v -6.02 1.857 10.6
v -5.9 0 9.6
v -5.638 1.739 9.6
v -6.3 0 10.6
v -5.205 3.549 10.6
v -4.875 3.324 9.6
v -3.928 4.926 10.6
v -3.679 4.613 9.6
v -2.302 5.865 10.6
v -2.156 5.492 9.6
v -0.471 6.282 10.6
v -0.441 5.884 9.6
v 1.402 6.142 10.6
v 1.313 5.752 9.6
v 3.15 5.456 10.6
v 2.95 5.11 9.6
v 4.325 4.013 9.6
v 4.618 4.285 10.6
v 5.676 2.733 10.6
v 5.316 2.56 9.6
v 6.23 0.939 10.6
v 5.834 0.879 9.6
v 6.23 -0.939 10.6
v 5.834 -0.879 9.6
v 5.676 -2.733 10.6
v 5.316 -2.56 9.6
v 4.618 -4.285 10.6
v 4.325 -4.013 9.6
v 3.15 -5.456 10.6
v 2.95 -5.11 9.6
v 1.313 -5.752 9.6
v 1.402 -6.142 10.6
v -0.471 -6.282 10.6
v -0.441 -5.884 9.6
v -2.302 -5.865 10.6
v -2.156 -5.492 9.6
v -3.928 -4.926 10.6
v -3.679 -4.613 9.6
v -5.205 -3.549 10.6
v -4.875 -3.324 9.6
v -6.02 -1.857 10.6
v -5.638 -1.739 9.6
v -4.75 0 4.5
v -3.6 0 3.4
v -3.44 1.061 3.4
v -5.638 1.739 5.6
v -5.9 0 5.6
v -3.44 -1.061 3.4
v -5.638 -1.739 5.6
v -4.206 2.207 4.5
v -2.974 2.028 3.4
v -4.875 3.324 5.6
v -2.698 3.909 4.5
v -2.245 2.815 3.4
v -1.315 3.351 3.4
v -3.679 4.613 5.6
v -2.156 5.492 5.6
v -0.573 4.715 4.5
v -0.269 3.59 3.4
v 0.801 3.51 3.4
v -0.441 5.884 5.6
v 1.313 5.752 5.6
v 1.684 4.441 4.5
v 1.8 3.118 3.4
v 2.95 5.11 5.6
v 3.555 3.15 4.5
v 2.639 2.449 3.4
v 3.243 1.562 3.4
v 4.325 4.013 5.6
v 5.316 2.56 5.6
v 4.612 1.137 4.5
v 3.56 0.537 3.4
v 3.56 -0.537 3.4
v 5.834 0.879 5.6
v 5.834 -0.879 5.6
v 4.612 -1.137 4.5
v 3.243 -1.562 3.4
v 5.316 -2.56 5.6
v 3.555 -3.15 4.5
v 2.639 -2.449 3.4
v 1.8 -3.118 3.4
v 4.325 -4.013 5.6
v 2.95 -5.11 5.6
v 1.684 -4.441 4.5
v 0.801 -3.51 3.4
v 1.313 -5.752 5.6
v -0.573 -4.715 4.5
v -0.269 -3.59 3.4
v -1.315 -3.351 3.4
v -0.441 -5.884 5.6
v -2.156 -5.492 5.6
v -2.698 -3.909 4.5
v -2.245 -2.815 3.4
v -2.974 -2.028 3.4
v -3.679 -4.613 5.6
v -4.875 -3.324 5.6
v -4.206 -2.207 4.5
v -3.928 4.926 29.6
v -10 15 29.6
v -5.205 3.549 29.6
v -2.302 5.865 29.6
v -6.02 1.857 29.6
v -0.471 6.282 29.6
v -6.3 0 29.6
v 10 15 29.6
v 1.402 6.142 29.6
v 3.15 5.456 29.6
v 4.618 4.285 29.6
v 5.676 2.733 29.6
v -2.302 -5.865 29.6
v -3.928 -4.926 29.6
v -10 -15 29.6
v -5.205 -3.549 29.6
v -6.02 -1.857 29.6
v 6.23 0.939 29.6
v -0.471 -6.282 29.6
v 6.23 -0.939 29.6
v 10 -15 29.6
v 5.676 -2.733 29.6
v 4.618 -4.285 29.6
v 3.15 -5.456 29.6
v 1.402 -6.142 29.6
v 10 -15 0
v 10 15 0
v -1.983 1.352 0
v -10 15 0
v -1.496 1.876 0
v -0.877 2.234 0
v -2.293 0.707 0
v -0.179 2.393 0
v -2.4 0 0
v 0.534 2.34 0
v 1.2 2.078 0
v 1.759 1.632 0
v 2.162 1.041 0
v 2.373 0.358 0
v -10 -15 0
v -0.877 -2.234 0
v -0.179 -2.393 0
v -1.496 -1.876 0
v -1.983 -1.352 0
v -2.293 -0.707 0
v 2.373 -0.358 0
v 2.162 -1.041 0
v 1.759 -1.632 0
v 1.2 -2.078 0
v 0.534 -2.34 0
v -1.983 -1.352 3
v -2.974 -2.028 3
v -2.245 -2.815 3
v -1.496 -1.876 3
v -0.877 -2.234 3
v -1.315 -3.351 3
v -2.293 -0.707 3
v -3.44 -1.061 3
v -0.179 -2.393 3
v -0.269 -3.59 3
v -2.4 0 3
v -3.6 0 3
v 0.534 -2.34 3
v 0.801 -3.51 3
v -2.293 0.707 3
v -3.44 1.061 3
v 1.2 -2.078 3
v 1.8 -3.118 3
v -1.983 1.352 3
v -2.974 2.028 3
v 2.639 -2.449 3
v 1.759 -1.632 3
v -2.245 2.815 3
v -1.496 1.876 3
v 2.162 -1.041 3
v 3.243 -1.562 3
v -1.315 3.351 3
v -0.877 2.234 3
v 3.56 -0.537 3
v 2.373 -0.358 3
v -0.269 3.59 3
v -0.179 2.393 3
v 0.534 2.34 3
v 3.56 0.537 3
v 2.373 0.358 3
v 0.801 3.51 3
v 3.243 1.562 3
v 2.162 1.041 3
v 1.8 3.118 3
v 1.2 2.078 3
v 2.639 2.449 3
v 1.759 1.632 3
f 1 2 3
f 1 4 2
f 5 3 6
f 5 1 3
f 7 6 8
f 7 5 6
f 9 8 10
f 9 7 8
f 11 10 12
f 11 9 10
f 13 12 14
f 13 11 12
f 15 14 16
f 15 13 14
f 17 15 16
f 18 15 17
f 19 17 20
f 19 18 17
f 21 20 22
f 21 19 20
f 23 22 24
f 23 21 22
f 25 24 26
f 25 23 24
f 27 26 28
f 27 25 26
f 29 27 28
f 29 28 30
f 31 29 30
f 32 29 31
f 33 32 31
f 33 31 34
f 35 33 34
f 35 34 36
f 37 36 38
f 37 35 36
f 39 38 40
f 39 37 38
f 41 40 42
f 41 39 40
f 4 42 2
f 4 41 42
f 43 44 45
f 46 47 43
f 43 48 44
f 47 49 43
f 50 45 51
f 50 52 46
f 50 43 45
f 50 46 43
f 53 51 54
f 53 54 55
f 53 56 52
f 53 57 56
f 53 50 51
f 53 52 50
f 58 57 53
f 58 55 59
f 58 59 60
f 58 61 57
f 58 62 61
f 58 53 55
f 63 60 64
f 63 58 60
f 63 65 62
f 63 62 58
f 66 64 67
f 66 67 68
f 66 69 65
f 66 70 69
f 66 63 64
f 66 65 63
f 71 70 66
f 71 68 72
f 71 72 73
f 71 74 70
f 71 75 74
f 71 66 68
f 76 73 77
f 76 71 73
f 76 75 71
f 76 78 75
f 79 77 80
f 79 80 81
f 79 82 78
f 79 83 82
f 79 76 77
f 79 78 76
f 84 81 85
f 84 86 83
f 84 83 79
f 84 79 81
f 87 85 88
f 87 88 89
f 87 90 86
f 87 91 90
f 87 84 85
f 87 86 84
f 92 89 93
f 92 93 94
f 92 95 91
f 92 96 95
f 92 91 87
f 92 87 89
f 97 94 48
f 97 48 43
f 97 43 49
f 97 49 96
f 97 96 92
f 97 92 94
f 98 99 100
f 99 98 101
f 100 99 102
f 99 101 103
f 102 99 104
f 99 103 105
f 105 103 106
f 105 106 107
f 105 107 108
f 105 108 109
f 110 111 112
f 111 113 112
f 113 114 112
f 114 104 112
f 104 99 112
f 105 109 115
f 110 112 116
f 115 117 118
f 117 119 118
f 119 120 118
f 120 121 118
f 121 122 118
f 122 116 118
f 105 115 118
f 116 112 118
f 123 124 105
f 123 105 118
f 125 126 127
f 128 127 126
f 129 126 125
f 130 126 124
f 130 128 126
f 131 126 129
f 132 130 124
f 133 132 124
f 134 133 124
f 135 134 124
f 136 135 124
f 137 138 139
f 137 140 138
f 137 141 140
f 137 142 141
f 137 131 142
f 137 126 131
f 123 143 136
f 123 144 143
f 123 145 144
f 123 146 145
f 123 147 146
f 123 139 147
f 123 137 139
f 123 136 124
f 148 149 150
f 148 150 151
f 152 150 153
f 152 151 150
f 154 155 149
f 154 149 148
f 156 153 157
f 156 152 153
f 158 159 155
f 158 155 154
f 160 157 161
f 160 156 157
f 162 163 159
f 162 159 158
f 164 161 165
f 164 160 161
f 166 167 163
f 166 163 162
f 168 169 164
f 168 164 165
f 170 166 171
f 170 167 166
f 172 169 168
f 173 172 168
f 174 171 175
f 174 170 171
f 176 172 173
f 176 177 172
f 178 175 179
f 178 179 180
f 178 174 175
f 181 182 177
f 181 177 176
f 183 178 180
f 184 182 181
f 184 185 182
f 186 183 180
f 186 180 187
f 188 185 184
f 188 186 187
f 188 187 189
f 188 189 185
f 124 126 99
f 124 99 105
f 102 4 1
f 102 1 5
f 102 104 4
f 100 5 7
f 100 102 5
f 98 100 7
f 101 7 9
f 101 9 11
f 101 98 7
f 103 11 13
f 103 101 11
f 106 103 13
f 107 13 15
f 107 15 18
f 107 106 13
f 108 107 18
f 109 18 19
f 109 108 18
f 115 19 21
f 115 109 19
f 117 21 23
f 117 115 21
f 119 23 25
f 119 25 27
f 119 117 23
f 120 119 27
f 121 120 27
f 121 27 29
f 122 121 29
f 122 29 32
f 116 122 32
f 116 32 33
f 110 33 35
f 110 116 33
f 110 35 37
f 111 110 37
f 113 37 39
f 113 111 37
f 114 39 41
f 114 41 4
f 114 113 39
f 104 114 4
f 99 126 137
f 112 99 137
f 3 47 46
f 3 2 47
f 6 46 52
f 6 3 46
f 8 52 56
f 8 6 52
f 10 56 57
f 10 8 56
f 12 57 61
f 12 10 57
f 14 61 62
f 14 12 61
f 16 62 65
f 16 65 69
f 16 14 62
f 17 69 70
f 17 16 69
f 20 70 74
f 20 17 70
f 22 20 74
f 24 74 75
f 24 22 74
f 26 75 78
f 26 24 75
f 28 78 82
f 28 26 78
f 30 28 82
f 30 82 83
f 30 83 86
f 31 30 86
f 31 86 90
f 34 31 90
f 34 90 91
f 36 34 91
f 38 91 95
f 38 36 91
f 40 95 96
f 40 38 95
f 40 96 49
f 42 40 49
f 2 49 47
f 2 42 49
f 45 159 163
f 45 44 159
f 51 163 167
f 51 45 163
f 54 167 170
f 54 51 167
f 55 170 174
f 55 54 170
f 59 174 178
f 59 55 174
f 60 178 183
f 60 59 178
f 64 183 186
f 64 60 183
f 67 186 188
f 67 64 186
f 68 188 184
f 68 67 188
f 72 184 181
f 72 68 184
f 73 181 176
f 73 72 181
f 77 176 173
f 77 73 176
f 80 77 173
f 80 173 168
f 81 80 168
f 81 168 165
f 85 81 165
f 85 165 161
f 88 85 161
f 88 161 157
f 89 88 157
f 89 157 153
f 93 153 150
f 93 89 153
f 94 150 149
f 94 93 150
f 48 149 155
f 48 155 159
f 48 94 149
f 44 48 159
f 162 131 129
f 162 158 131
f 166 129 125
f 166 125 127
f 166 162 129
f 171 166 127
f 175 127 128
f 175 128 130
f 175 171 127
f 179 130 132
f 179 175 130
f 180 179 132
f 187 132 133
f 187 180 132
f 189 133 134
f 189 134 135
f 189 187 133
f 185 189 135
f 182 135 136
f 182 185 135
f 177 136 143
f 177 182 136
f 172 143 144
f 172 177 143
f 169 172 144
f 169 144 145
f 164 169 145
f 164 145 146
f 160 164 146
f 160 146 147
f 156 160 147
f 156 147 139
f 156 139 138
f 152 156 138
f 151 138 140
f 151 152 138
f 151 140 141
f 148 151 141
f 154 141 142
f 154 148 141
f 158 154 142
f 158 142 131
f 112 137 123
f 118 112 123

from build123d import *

# Parameters (mm, degrees)
F2_W     = 20
F2_H     = 30
F2_R     = 8.3
F3_DEPTH = 29.6


with BuildPart() as f1:
    # F0 (on Front) → F1 (revolve)
    with BuildSketch(Plane.XZ):
        Polygon((-3.6, 3), (-3.6, 3.4), (-5.9, 5.6), (-5.9, 9.6), (-6.3, 10.6), (-6.3, 29.6), (-8.3, 29.6), (-8.3, 0), (-2.4, 0), (-2.4, 3), align=None)
    revolve(axis=Axis((0, 0, 14.8), (0, 0, -1)))

    # F2 (on face) → F3 (join)
    with BuildSketch(Plane(origin=(0, 0, 0), x_dir=(1, 0, 0), z_dir=(0, 0, -1))):
        Rectangle(F2_W, F2_H)
        Circle(F2_R, mode=Mode.SUBTRACT)
    extrude(amount=-F3_DEPTH)


solid = f1.part
